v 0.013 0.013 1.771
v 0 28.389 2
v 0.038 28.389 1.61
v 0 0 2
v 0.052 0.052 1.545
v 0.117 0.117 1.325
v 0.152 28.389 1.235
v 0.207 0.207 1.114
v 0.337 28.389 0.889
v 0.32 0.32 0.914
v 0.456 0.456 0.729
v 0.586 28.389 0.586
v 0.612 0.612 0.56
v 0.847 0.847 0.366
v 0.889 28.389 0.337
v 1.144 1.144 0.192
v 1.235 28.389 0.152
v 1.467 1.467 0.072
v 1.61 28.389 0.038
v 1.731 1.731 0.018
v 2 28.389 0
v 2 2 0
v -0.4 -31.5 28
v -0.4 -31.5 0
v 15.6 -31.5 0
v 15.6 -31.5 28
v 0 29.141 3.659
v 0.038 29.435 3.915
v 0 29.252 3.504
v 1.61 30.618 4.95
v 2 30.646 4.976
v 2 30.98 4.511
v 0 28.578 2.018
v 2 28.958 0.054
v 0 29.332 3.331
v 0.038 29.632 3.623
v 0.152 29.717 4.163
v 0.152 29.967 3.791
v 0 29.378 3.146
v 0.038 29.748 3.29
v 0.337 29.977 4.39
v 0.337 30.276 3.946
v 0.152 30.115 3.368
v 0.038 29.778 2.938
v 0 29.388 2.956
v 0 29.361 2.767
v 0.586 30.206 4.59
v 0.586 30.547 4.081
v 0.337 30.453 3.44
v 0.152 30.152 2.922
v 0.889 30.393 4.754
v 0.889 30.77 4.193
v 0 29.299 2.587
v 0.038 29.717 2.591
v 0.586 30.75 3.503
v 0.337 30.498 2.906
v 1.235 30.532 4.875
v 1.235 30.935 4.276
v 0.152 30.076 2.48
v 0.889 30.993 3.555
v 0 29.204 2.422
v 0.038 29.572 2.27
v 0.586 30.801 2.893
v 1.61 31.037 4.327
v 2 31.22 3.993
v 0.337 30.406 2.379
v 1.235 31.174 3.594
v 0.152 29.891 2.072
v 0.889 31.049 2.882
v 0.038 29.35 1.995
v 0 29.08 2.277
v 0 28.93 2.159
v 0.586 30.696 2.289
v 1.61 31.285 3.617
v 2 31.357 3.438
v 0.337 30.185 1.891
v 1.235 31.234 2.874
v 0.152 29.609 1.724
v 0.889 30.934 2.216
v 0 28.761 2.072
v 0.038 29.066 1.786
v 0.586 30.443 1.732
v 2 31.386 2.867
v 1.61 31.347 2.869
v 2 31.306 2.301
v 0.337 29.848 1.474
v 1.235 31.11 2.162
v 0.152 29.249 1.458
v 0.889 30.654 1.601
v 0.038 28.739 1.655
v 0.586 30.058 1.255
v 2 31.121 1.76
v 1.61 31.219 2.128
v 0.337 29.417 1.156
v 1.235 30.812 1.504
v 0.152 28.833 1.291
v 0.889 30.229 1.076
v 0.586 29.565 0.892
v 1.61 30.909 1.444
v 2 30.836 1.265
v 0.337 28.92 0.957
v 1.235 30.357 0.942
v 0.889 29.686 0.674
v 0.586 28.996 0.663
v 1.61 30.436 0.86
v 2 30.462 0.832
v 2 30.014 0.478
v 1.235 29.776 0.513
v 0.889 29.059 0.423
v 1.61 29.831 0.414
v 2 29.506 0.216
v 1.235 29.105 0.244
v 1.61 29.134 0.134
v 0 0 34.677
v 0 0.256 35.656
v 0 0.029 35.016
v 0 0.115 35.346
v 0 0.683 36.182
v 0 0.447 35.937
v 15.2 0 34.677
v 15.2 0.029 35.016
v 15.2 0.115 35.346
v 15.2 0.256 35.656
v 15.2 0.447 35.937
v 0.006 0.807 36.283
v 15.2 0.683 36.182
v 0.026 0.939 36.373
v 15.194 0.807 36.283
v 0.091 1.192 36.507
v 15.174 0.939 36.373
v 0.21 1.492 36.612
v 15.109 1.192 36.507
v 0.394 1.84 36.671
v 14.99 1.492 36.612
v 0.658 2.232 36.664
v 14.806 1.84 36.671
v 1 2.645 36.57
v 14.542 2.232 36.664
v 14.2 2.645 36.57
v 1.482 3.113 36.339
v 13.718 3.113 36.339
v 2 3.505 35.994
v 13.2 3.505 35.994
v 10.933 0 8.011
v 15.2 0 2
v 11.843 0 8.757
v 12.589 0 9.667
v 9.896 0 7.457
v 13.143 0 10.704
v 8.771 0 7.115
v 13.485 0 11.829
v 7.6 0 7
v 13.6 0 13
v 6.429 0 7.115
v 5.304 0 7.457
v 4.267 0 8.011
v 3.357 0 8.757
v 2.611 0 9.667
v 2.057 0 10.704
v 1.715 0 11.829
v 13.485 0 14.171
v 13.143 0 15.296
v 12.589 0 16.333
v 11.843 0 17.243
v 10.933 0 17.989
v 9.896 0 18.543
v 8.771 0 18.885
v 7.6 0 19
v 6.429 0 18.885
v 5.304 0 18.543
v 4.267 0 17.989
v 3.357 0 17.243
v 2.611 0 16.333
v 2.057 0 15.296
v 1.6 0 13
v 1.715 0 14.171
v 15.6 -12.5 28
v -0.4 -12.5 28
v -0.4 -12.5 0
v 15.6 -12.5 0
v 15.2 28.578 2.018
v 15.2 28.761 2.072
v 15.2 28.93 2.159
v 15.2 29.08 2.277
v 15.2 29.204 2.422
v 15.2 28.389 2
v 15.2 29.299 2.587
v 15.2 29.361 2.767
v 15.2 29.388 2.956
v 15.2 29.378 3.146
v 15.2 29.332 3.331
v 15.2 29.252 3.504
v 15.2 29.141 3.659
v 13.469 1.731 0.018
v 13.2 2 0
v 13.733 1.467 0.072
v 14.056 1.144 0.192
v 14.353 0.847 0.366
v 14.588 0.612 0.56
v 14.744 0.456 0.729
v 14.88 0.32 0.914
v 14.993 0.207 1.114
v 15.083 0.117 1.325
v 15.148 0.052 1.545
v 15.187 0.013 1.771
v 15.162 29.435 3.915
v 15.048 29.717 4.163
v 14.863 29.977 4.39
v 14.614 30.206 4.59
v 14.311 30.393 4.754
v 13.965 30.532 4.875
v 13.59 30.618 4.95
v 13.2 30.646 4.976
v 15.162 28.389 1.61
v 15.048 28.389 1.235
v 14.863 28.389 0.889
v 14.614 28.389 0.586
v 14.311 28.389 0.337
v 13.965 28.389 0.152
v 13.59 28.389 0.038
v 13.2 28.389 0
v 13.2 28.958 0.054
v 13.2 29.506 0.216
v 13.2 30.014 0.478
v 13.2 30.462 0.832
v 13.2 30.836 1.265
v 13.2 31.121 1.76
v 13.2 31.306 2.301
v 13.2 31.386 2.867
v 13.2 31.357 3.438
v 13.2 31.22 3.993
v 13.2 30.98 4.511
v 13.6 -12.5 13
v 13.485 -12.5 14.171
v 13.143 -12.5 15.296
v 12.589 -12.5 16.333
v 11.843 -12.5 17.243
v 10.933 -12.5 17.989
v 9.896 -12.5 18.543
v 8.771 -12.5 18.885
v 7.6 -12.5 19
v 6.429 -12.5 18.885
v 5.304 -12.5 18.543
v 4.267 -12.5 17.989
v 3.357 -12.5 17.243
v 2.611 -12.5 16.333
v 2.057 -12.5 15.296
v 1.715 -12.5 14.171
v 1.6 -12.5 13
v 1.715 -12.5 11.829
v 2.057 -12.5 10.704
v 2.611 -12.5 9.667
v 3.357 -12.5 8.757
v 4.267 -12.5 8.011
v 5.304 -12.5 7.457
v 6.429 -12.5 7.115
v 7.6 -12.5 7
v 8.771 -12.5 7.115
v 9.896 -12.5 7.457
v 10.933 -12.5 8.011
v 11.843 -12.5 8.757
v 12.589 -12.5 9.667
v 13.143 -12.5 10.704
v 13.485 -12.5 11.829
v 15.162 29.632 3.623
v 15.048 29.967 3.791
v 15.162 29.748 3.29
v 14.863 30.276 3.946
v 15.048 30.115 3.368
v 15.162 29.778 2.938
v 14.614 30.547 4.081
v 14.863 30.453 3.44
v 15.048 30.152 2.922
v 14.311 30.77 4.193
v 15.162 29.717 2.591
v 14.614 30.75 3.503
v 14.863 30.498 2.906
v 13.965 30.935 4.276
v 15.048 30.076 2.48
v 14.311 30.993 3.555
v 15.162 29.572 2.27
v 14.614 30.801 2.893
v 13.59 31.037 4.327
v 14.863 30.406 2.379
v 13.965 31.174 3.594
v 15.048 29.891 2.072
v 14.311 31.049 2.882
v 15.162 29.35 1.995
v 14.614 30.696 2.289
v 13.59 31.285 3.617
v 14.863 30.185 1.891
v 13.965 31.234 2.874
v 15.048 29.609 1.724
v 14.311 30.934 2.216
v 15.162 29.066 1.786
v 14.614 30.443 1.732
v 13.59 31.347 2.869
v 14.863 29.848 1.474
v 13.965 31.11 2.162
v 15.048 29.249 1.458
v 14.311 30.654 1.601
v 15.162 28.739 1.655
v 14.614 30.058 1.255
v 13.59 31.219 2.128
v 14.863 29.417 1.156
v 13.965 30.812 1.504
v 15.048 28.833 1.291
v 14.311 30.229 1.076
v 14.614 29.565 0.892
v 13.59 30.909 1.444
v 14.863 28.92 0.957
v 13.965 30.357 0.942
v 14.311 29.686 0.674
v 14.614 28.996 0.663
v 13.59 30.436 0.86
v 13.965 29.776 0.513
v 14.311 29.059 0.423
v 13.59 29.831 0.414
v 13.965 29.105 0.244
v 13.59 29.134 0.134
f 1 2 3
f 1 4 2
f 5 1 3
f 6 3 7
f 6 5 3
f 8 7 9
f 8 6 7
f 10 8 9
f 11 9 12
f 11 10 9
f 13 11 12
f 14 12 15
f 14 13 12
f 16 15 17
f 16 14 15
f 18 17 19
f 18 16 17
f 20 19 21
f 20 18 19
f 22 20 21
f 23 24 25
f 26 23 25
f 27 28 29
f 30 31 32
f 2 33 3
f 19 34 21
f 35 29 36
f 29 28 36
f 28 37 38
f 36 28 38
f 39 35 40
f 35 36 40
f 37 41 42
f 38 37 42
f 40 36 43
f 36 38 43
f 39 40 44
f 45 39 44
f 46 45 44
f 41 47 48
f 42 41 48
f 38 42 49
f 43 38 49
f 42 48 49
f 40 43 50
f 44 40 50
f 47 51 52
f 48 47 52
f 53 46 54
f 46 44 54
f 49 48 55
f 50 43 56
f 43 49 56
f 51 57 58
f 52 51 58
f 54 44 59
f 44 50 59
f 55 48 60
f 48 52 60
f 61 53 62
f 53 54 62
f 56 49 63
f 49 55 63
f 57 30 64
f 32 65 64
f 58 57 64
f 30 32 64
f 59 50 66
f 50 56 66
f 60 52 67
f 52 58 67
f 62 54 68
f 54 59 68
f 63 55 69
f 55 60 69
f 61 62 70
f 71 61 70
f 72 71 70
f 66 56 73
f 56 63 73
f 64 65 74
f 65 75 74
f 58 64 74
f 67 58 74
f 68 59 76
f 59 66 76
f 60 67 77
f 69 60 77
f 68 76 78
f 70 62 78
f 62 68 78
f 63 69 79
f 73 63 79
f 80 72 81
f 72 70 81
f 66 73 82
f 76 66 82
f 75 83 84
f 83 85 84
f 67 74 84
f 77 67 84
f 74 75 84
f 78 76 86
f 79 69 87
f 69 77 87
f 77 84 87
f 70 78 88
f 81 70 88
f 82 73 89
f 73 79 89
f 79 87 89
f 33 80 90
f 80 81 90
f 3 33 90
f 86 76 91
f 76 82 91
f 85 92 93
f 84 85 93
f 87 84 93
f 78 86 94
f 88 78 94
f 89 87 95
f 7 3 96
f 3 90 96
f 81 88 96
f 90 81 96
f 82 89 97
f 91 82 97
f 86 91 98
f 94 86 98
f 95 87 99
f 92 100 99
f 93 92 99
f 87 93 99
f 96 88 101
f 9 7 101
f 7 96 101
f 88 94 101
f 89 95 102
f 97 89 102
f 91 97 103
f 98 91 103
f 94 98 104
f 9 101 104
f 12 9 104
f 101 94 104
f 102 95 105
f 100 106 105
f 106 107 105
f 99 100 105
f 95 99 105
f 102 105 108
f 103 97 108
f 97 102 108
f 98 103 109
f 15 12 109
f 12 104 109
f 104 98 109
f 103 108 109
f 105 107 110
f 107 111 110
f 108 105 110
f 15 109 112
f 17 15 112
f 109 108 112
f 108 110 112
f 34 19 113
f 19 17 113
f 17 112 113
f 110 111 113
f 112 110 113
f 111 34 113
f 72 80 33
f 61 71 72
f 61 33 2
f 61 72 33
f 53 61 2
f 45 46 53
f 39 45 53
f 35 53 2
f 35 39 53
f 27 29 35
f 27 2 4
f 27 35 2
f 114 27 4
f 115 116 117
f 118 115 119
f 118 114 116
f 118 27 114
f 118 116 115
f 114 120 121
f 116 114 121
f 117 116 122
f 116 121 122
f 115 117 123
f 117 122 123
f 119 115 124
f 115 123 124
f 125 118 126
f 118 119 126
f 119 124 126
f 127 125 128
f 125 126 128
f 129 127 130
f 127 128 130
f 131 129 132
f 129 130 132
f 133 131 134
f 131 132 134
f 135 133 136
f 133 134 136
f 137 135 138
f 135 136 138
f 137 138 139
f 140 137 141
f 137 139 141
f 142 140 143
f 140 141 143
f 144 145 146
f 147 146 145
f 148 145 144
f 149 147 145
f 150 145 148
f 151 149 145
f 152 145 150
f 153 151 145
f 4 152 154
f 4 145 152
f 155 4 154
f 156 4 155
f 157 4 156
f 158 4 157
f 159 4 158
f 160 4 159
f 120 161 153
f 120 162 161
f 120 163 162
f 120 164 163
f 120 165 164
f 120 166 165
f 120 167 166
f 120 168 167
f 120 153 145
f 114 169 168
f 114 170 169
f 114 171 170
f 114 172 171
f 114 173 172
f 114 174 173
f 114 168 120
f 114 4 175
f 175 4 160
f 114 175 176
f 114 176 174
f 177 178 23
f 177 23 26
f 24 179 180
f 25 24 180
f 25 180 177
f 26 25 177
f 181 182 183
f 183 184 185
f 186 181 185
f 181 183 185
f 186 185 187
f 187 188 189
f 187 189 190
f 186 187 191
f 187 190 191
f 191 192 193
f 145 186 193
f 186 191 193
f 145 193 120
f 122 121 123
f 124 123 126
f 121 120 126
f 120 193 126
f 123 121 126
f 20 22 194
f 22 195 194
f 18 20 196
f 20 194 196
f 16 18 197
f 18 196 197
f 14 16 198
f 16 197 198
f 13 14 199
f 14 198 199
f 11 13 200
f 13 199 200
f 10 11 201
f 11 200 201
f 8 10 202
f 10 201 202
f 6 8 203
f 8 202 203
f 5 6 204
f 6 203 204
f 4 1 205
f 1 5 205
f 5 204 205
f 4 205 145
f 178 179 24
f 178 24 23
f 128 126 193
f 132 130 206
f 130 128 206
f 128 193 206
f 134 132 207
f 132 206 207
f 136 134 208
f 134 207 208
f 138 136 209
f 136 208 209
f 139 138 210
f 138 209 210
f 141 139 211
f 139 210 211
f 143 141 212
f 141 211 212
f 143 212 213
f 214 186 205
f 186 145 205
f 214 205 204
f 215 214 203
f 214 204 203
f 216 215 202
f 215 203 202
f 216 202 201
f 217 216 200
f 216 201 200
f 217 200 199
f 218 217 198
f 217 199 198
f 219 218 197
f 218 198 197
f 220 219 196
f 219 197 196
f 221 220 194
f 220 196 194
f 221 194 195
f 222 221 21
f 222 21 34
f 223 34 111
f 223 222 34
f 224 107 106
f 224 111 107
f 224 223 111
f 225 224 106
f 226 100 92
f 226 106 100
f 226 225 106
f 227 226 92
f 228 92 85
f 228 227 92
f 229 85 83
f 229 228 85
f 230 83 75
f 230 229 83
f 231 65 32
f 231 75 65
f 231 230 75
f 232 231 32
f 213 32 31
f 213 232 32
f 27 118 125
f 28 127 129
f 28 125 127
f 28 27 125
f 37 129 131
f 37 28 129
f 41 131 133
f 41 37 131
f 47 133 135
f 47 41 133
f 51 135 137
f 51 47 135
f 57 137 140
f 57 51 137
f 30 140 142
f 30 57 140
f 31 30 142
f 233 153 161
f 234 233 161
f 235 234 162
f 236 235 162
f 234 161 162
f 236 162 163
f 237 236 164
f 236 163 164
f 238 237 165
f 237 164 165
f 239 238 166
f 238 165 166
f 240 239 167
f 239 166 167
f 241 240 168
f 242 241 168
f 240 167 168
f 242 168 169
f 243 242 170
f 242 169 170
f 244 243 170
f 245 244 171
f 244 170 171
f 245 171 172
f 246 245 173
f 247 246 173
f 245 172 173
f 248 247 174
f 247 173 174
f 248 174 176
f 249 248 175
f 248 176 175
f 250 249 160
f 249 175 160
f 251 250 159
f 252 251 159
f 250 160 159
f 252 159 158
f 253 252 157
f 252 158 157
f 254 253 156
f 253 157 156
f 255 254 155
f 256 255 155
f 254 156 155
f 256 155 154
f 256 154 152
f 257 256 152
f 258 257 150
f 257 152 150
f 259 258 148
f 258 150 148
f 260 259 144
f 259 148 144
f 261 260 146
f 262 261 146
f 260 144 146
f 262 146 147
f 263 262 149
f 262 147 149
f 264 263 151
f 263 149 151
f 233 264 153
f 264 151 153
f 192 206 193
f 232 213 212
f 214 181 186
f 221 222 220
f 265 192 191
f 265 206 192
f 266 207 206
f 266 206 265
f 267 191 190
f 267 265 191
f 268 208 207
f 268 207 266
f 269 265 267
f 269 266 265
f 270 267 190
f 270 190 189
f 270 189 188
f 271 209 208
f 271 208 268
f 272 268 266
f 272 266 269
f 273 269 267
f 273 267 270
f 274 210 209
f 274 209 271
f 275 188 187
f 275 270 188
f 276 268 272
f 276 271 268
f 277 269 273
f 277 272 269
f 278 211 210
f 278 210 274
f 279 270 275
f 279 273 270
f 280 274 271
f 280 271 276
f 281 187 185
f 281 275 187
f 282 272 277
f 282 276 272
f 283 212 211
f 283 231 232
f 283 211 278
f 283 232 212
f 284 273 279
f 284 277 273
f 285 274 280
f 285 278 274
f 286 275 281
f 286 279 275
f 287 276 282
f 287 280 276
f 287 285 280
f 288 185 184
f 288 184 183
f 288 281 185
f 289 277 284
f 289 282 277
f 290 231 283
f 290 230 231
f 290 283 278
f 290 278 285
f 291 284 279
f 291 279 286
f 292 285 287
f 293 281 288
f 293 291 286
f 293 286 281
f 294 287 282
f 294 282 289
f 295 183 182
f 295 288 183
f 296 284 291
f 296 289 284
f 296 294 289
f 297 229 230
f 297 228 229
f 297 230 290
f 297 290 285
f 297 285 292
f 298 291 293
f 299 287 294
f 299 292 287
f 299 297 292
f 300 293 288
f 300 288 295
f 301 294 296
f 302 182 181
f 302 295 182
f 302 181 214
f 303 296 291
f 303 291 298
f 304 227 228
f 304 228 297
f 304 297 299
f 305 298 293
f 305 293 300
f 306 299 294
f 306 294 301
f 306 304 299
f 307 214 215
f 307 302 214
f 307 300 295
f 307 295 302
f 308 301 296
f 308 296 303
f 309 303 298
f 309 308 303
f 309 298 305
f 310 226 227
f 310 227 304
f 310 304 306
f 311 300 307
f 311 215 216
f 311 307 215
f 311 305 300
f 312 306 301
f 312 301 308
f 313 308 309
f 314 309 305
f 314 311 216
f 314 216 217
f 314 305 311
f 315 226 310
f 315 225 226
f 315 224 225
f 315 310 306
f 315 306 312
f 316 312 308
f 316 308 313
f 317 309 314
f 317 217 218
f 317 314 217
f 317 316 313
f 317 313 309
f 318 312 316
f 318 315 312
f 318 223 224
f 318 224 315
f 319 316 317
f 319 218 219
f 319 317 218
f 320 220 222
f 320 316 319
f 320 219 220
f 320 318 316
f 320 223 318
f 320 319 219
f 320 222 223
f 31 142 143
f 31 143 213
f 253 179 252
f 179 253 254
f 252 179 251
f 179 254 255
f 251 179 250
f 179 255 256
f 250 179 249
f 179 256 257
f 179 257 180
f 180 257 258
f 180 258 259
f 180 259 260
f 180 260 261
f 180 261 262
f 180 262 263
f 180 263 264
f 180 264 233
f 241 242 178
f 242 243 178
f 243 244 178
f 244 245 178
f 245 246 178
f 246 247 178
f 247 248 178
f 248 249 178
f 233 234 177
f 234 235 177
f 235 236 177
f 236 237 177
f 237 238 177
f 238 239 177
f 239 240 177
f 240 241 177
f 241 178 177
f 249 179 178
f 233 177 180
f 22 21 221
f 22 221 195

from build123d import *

# Parameters (mm, degrees)
BOSS_EXTRUDE1_DEPTH = 15.2
SKETCH2_R           = 6
BOSS_EXTRUDE2_DEPTH = 12.5
SKETCH3_W           = 16
SKETCH3_H           = 28
BOSS_EXTRUDE3_DEPTH = 19
FILLET1_R           = 3
FILLET2_R           = 2


with BuildPart() as part:
    # Sketch1 → Boss-Extrude1 (new body)
    with BuildSketch(Plane(origin=(0, 0, 0), x_dir=(0, 0, -1), z_dir=(1, 0, 0))):
        Polygon((0, 0), (-40, 0), (0, 35), align=None)
    extrude(amount=BOSS_EXTRUDE1_DEPTH)

    # Sketch2 → Boss-Extrude2 (add)
    with BuildSketch(Plane.XZ):
        with Locations((7.6, 13)):
            Circle(SKETCH2_R)
    extrude(amount=BOSS_EXTRUDE2_DEPTH)

    # Sketch3 → Boss-Extrude3 (add)
    with BuildSketch(Plane.XZ.offset(12.5)):
        with Locations((7.6, 14)):
            Rectangle(SKETCH3_W, SKETCH3_H)
    extrude(amount=BOSS_EXTRUDE3_DEPTH)

    # Fillet1
    fillet1_edges = [part.edges().sort_by_distance(p)[0] for p in [
        (7.6, 35, 0),
    ]]
    fillet(fillet1_edges, radius=FILLET1_R)

    # Fillet2
    fillet2_edges = [part.edges().sort_by_distance(p)[0] for p in [
        (0, 15.323212702, 22.487756912),
        (15.2, 15.323212702, 22.487756912),
        (0, 31.120594062, 1.760351153),
        (15.2, 31.120594062, 1.760351153),
        (15.2, 14.19434766, 0),
        (0, 14.19434766, 0),
        (7.6, 0, 0),
        (7.6, 0, 40),
    ]]
    fillet(fillet2_edges, radius=FILLET2_R)


solid = part.part
